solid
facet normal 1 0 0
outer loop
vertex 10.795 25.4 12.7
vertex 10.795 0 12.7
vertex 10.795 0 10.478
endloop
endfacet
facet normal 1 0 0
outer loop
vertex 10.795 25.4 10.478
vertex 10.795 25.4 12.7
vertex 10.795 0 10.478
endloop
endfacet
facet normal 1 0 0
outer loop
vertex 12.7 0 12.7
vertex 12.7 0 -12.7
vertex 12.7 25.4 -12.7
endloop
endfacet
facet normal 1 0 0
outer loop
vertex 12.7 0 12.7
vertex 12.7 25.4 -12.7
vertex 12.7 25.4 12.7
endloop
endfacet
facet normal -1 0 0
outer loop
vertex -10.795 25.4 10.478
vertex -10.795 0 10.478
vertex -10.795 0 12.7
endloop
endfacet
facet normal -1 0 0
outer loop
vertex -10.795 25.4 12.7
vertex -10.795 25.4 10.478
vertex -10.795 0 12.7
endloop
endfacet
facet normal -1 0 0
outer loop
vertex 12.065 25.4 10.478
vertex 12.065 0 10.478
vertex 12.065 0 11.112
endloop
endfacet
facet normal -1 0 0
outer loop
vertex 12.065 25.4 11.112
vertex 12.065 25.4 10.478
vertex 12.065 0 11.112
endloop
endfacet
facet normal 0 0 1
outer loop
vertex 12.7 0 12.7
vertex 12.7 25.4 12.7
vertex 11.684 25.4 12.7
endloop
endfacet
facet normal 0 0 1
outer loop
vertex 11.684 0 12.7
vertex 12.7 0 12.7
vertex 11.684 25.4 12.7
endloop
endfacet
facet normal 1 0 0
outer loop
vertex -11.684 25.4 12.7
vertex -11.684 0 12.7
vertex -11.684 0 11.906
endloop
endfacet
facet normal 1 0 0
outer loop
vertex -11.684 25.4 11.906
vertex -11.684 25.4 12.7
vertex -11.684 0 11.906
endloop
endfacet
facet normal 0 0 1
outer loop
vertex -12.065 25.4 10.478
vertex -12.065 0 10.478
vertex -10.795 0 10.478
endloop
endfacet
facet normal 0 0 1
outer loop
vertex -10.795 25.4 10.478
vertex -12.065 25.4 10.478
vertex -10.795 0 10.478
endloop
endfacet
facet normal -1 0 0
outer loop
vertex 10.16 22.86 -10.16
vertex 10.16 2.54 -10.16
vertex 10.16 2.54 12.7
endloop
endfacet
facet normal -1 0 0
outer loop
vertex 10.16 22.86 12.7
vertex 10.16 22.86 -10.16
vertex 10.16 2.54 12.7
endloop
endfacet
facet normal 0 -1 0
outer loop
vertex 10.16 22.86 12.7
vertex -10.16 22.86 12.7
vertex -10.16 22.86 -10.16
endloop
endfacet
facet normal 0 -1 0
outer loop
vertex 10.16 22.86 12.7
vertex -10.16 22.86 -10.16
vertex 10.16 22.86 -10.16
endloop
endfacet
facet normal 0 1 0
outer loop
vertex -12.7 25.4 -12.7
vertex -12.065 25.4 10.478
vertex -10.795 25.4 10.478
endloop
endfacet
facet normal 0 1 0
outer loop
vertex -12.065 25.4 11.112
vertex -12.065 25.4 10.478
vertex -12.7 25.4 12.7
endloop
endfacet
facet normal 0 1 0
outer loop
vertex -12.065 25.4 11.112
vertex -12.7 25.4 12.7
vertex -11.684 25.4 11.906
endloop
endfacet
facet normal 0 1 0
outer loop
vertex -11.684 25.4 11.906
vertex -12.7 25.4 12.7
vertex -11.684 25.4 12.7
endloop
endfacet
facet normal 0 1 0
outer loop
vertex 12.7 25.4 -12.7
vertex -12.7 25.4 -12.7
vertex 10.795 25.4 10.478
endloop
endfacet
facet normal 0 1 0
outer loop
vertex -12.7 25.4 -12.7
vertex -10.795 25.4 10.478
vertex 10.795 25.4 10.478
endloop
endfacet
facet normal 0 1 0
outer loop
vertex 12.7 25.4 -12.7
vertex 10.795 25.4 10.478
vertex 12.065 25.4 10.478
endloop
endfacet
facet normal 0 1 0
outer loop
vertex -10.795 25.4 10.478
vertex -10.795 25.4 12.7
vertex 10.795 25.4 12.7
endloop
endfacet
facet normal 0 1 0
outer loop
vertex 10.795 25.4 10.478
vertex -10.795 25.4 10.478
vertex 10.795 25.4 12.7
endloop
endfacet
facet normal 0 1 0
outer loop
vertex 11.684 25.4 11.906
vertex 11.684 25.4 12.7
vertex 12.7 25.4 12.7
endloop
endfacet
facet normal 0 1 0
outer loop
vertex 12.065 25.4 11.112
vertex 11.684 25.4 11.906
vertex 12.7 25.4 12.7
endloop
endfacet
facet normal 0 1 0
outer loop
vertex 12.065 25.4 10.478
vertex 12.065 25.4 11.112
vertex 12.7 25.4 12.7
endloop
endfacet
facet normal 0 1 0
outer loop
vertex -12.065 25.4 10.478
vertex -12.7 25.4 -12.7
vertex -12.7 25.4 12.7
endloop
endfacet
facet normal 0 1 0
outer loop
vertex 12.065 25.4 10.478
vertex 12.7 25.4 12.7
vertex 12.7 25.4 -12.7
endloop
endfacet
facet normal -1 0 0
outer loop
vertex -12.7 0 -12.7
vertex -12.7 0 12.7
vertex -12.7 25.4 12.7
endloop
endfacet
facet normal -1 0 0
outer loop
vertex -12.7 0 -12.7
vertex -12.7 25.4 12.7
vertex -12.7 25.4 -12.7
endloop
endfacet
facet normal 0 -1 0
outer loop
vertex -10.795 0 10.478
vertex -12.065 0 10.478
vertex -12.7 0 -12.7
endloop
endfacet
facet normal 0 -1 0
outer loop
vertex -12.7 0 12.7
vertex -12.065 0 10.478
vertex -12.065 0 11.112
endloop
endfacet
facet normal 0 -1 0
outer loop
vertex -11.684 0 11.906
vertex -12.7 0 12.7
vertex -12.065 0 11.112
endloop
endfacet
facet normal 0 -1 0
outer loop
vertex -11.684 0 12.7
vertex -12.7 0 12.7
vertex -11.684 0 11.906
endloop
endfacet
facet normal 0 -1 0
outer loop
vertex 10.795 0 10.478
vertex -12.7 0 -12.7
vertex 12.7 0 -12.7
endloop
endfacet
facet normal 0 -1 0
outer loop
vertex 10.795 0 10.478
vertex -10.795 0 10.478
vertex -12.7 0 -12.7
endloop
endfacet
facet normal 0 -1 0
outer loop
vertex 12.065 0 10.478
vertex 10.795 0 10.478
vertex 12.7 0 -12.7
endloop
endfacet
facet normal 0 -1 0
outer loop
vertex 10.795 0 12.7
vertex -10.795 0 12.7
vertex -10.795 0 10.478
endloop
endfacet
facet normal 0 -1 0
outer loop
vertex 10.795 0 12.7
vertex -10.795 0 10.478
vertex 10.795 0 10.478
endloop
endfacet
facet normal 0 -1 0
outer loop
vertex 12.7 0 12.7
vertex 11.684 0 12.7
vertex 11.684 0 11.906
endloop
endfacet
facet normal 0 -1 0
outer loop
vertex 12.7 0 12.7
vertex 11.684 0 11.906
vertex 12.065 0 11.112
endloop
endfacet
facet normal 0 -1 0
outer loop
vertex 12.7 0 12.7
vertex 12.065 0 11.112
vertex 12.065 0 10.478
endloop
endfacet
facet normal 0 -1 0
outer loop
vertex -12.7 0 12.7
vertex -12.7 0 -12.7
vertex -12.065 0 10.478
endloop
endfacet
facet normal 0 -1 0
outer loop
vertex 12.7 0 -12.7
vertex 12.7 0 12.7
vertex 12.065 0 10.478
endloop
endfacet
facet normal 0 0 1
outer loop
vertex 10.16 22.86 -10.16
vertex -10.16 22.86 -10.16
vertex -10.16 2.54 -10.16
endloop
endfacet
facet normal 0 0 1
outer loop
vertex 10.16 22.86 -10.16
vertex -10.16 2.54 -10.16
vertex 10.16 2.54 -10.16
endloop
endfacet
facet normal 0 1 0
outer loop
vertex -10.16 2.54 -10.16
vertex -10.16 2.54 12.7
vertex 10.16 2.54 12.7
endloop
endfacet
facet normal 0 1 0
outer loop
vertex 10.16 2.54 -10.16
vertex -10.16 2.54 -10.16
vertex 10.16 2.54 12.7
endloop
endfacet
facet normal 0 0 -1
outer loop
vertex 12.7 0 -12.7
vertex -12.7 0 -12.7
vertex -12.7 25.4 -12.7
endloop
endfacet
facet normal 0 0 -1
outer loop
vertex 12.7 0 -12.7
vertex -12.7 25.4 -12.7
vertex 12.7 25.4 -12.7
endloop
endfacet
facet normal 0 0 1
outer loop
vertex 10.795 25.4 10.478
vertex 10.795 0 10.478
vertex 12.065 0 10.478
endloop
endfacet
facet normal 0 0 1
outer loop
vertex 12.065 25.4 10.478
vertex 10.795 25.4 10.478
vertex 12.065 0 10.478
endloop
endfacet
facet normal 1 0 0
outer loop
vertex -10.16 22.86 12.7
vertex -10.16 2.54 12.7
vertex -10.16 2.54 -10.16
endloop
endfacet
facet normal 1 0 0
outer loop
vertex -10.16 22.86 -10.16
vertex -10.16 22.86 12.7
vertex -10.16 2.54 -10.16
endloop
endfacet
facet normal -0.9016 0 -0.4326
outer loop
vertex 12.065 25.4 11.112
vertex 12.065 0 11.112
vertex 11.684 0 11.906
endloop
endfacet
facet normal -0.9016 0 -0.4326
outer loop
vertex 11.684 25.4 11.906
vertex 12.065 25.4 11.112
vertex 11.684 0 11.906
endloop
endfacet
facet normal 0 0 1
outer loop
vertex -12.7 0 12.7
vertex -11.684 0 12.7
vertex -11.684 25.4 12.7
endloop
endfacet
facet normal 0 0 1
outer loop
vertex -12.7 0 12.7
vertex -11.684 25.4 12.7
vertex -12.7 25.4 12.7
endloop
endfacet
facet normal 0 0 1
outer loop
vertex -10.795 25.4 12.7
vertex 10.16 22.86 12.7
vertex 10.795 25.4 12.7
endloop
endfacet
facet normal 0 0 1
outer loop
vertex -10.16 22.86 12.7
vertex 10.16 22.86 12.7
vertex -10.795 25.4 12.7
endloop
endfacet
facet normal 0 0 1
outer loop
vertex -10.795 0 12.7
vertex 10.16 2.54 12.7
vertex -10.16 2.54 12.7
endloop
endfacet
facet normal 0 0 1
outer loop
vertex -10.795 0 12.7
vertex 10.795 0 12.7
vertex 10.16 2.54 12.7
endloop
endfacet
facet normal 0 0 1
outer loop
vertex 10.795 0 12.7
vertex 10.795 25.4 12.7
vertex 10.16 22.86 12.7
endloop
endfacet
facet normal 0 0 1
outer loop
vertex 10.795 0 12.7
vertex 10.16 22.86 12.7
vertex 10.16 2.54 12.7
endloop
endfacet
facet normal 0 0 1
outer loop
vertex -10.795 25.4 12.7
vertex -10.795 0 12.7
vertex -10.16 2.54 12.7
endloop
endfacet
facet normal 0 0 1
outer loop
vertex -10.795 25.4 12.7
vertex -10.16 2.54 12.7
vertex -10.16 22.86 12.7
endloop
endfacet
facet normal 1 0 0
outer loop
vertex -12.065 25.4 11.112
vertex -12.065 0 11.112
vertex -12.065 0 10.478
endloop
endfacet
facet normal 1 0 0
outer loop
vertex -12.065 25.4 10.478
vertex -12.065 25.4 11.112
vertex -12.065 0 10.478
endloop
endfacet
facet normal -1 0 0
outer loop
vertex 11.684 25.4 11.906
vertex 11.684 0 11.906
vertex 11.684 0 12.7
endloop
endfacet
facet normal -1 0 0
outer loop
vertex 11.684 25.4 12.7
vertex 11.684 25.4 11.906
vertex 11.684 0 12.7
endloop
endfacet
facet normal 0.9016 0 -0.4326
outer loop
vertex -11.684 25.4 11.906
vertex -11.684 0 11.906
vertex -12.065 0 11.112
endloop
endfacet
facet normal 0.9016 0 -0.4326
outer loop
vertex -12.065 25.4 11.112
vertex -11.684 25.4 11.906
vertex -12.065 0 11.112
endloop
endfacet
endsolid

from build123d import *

# Parameters (mm, degrees)
F2_DEPTH = 11.43
F3_DEPTH = 25.4
F4_T     = -2.54
F7_DEPTH = 25.4


with BuildPart() as f2:
    # F1 (on Top) → F2 (new body, symmetric)
    with BuildSketch(Plane.XY):
        Polygon((0, 1.27), (11.43, 1.27), (11.43, 24.13), (-11.43, 24.13), (-11.43, 1.27), align=None)
    extrude(amount=F2_DEPTH, both=True)


with BuildPart() as f3:
    # F0 (on Front) → F3 (new body)
    with BuildSketch(Plane.XZ):
        Polygon((-12.7, -12.7), (12.7, -12.7), (12.7, 12.7), (0, 12.7), (-12.7, 12.7), align=None)
    extrude(amount=-F3_DEPTH)

    # F4
    f4_openings = [f3.faces().sort_by_distance(p)[0] for p in [
        (0, 12.7, 12.7),
    ]]
    offset(amount=F4_T, openings=f4_openings)

    # F6 (on Front) → F7 (cut)
    with BuildSketch(Plane.XZ):
        Polygon((-12.065, 10.4775), (-10.795, 10.4775), (-10.795, 11.1125), (-10.795, 12.7), (-11.684, 12.7), (-11.684, 11.90625), (-12.065, 11.1125), align=None)
        Polygon((10.795, 10.4775), (12.065, 10.4775), (12.065, 11.1125), (11.684, 11.90625), (11.684, 12.7), (10.795, 12.7), (10.795, 11.1125), align=None)
    extrude(amount=-F7_DEPTH, mode=Mode.SUBTRACT)


solid = f3.part
